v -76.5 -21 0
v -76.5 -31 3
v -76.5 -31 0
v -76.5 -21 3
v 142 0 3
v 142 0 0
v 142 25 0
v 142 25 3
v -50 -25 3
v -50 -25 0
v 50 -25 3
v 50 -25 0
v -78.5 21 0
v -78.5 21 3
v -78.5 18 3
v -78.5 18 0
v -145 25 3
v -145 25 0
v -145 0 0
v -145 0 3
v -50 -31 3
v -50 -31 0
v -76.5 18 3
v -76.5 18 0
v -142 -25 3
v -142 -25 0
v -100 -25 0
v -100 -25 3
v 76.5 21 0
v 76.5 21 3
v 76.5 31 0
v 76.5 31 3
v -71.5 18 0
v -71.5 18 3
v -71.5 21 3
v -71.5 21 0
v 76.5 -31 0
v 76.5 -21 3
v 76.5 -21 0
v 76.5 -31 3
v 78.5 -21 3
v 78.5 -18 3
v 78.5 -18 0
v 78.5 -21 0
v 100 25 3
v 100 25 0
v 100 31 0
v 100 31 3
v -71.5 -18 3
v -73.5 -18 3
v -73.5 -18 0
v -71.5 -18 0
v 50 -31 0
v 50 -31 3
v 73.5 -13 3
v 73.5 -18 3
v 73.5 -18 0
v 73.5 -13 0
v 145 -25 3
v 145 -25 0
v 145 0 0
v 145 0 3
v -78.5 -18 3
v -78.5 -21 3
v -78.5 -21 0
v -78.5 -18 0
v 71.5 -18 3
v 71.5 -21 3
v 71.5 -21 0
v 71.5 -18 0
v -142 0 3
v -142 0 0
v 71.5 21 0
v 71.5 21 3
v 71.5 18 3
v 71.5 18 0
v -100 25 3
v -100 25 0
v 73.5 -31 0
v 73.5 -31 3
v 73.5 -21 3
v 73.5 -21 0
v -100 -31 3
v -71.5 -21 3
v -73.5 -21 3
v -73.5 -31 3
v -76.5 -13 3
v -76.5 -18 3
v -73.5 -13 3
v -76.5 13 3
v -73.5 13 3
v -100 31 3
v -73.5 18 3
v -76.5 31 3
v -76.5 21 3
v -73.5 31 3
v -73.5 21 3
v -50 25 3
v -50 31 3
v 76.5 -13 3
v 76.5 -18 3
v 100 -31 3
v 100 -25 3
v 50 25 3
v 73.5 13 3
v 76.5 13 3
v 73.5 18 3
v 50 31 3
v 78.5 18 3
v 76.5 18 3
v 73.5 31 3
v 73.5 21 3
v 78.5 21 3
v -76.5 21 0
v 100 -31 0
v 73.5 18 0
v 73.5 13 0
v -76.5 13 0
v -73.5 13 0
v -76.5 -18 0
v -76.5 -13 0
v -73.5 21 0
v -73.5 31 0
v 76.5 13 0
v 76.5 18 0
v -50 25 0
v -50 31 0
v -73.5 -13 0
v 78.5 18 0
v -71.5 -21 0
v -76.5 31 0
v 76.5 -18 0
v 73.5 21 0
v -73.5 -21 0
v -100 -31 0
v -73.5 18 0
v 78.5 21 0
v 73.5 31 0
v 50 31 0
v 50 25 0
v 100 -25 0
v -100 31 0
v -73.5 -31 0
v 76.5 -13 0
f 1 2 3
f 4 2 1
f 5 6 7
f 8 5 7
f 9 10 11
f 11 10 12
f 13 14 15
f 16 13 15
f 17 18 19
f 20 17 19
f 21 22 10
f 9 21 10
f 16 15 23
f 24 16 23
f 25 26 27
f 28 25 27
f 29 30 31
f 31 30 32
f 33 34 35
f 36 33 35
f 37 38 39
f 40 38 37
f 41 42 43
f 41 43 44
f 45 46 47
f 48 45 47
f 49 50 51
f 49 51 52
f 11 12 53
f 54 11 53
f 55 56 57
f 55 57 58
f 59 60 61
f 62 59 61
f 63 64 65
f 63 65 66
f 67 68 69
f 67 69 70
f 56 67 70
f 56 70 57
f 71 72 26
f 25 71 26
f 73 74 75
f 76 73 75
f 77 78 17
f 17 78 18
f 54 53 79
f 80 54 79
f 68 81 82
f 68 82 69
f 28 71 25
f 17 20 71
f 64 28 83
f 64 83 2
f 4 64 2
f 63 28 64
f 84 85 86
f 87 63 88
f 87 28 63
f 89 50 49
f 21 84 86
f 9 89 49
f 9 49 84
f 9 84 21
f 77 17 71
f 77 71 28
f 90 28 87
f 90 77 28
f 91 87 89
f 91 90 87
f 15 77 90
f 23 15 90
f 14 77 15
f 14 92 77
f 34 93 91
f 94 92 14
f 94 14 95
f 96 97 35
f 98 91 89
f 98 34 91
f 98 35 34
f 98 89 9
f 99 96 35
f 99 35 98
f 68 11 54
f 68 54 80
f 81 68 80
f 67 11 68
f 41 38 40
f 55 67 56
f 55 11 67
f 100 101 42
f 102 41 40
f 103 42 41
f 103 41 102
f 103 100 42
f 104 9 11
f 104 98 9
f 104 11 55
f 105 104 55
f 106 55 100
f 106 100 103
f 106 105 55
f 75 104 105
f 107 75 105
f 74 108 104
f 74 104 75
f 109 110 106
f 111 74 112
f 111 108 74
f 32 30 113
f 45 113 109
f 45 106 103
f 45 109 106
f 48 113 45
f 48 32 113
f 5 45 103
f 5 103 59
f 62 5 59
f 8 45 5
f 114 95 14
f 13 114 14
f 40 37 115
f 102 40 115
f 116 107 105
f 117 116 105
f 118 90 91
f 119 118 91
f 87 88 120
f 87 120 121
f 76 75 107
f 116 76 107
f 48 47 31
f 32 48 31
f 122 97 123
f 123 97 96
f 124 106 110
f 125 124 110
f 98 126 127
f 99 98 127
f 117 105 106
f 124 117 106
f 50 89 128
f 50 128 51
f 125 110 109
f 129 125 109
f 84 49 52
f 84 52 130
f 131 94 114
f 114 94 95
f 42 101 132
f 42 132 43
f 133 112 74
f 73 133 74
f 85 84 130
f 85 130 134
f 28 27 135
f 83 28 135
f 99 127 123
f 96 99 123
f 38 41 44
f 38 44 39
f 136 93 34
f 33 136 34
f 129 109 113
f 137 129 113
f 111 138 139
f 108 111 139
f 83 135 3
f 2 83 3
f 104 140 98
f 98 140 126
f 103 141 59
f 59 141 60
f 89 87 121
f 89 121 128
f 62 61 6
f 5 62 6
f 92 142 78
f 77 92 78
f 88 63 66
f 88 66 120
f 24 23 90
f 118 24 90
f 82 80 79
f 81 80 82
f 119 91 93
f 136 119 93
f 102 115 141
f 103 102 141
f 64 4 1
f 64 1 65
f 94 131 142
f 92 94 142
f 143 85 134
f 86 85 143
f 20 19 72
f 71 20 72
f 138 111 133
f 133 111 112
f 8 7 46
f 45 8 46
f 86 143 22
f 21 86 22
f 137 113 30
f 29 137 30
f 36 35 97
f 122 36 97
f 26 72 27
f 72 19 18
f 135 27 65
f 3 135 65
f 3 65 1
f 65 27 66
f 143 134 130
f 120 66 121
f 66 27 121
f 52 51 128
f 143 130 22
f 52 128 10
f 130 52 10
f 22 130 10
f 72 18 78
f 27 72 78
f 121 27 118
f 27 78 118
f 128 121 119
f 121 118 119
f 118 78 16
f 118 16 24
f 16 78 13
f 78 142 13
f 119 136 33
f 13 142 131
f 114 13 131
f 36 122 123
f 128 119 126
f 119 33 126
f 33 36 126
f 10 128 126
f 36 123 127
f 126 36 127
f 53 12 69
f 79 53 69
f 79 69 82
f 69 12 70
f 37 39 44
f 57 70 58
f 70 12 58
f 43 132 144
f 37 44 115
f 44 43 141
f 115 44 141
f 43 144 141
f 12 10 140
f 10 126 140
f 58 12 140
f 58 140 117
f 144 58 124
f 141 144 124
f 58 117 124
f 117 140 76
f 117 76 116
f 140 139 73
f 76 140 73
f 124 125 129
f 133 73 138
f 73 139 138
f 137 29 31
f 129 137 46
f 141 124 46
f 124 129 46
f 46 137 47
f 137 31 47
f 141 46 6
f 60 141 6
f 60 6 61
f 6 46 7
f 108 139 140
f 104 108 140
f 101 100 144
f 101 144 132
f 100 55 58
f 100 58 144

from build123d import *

# Parameters (mm, degrees)
BOSS_EXTRUDE1_DEPTH = 3
CUT_EXTRUDE1_DEPTH  = 10


with BuildPart() as part:
    # Sketch1 → Boss-Extrude1 (new body)
    with BuildSketch(Plane.XY):
        Polygon((-145, 0), (-142, 0), (-142, -25), (-100, -25), (-100, -31), (-50, -31), (-50, -25), (50, -25), (50, -31), (100, -31), (100, -25), (145, -25), (145, 0), (142, 0), (142, 25), (100, 25), (100, 31), (50, 31), (50, 25), (-50, 25), (-50, 31), (-100, 31), (-100, 25), (-145, 25), align=None)
    extrude(amount=BOSS_EXTRUDE1_DEPTH)

    # Sketch2 → Cut-Extrude1 (cut)
    with BuildSketch(Plane.XY.offset(3)):
        Polygon((-75, 31), (-76.5, 31), (-76.5, 21), (-78.5, 21), (-78.5, 18), (-76.5, 18), (-76.5, 13), (-73.5, 13), (-73.5, 18), (-71.5, 18), (-71.5, 21), (-73.5, 21), (-73.5, 31), align=None)
        Polygon((-76.5, -31), (-76.5, -21), (-78.5, -21), (-78.5, -18), (-76.5, -18), (-76.5, -13), (-73.5, -13), (-73.5, -18), (-71.5, -18), (-71.5, -21), (-73.5, -21), (-73.5, -31), align=None)
        Polygon((73.5, 31), (73.5, 21), (71.5, 21), (71.5, 18), (73.5, 18), (73.5, 13), (76.5, 13), (76.5, 18), (78.5, 18), (78.5, 21), (76.5, 21), (76.5, 31), align=None)
        Polygon((73.5, -31), (73.5, -21), (71.5, -21), (71.5, -18), (73.5, -18), (73.5, -13), (76.5, -13), (76.5, -18), (78.5, -18), (78.5, -21), (76.5, -21), (76.5, -31), align=None)
    extrude(amount=-CUT_EXTRUDE1_DEPTH, mode=Mode.SUBTRACT)


solid = part.part
